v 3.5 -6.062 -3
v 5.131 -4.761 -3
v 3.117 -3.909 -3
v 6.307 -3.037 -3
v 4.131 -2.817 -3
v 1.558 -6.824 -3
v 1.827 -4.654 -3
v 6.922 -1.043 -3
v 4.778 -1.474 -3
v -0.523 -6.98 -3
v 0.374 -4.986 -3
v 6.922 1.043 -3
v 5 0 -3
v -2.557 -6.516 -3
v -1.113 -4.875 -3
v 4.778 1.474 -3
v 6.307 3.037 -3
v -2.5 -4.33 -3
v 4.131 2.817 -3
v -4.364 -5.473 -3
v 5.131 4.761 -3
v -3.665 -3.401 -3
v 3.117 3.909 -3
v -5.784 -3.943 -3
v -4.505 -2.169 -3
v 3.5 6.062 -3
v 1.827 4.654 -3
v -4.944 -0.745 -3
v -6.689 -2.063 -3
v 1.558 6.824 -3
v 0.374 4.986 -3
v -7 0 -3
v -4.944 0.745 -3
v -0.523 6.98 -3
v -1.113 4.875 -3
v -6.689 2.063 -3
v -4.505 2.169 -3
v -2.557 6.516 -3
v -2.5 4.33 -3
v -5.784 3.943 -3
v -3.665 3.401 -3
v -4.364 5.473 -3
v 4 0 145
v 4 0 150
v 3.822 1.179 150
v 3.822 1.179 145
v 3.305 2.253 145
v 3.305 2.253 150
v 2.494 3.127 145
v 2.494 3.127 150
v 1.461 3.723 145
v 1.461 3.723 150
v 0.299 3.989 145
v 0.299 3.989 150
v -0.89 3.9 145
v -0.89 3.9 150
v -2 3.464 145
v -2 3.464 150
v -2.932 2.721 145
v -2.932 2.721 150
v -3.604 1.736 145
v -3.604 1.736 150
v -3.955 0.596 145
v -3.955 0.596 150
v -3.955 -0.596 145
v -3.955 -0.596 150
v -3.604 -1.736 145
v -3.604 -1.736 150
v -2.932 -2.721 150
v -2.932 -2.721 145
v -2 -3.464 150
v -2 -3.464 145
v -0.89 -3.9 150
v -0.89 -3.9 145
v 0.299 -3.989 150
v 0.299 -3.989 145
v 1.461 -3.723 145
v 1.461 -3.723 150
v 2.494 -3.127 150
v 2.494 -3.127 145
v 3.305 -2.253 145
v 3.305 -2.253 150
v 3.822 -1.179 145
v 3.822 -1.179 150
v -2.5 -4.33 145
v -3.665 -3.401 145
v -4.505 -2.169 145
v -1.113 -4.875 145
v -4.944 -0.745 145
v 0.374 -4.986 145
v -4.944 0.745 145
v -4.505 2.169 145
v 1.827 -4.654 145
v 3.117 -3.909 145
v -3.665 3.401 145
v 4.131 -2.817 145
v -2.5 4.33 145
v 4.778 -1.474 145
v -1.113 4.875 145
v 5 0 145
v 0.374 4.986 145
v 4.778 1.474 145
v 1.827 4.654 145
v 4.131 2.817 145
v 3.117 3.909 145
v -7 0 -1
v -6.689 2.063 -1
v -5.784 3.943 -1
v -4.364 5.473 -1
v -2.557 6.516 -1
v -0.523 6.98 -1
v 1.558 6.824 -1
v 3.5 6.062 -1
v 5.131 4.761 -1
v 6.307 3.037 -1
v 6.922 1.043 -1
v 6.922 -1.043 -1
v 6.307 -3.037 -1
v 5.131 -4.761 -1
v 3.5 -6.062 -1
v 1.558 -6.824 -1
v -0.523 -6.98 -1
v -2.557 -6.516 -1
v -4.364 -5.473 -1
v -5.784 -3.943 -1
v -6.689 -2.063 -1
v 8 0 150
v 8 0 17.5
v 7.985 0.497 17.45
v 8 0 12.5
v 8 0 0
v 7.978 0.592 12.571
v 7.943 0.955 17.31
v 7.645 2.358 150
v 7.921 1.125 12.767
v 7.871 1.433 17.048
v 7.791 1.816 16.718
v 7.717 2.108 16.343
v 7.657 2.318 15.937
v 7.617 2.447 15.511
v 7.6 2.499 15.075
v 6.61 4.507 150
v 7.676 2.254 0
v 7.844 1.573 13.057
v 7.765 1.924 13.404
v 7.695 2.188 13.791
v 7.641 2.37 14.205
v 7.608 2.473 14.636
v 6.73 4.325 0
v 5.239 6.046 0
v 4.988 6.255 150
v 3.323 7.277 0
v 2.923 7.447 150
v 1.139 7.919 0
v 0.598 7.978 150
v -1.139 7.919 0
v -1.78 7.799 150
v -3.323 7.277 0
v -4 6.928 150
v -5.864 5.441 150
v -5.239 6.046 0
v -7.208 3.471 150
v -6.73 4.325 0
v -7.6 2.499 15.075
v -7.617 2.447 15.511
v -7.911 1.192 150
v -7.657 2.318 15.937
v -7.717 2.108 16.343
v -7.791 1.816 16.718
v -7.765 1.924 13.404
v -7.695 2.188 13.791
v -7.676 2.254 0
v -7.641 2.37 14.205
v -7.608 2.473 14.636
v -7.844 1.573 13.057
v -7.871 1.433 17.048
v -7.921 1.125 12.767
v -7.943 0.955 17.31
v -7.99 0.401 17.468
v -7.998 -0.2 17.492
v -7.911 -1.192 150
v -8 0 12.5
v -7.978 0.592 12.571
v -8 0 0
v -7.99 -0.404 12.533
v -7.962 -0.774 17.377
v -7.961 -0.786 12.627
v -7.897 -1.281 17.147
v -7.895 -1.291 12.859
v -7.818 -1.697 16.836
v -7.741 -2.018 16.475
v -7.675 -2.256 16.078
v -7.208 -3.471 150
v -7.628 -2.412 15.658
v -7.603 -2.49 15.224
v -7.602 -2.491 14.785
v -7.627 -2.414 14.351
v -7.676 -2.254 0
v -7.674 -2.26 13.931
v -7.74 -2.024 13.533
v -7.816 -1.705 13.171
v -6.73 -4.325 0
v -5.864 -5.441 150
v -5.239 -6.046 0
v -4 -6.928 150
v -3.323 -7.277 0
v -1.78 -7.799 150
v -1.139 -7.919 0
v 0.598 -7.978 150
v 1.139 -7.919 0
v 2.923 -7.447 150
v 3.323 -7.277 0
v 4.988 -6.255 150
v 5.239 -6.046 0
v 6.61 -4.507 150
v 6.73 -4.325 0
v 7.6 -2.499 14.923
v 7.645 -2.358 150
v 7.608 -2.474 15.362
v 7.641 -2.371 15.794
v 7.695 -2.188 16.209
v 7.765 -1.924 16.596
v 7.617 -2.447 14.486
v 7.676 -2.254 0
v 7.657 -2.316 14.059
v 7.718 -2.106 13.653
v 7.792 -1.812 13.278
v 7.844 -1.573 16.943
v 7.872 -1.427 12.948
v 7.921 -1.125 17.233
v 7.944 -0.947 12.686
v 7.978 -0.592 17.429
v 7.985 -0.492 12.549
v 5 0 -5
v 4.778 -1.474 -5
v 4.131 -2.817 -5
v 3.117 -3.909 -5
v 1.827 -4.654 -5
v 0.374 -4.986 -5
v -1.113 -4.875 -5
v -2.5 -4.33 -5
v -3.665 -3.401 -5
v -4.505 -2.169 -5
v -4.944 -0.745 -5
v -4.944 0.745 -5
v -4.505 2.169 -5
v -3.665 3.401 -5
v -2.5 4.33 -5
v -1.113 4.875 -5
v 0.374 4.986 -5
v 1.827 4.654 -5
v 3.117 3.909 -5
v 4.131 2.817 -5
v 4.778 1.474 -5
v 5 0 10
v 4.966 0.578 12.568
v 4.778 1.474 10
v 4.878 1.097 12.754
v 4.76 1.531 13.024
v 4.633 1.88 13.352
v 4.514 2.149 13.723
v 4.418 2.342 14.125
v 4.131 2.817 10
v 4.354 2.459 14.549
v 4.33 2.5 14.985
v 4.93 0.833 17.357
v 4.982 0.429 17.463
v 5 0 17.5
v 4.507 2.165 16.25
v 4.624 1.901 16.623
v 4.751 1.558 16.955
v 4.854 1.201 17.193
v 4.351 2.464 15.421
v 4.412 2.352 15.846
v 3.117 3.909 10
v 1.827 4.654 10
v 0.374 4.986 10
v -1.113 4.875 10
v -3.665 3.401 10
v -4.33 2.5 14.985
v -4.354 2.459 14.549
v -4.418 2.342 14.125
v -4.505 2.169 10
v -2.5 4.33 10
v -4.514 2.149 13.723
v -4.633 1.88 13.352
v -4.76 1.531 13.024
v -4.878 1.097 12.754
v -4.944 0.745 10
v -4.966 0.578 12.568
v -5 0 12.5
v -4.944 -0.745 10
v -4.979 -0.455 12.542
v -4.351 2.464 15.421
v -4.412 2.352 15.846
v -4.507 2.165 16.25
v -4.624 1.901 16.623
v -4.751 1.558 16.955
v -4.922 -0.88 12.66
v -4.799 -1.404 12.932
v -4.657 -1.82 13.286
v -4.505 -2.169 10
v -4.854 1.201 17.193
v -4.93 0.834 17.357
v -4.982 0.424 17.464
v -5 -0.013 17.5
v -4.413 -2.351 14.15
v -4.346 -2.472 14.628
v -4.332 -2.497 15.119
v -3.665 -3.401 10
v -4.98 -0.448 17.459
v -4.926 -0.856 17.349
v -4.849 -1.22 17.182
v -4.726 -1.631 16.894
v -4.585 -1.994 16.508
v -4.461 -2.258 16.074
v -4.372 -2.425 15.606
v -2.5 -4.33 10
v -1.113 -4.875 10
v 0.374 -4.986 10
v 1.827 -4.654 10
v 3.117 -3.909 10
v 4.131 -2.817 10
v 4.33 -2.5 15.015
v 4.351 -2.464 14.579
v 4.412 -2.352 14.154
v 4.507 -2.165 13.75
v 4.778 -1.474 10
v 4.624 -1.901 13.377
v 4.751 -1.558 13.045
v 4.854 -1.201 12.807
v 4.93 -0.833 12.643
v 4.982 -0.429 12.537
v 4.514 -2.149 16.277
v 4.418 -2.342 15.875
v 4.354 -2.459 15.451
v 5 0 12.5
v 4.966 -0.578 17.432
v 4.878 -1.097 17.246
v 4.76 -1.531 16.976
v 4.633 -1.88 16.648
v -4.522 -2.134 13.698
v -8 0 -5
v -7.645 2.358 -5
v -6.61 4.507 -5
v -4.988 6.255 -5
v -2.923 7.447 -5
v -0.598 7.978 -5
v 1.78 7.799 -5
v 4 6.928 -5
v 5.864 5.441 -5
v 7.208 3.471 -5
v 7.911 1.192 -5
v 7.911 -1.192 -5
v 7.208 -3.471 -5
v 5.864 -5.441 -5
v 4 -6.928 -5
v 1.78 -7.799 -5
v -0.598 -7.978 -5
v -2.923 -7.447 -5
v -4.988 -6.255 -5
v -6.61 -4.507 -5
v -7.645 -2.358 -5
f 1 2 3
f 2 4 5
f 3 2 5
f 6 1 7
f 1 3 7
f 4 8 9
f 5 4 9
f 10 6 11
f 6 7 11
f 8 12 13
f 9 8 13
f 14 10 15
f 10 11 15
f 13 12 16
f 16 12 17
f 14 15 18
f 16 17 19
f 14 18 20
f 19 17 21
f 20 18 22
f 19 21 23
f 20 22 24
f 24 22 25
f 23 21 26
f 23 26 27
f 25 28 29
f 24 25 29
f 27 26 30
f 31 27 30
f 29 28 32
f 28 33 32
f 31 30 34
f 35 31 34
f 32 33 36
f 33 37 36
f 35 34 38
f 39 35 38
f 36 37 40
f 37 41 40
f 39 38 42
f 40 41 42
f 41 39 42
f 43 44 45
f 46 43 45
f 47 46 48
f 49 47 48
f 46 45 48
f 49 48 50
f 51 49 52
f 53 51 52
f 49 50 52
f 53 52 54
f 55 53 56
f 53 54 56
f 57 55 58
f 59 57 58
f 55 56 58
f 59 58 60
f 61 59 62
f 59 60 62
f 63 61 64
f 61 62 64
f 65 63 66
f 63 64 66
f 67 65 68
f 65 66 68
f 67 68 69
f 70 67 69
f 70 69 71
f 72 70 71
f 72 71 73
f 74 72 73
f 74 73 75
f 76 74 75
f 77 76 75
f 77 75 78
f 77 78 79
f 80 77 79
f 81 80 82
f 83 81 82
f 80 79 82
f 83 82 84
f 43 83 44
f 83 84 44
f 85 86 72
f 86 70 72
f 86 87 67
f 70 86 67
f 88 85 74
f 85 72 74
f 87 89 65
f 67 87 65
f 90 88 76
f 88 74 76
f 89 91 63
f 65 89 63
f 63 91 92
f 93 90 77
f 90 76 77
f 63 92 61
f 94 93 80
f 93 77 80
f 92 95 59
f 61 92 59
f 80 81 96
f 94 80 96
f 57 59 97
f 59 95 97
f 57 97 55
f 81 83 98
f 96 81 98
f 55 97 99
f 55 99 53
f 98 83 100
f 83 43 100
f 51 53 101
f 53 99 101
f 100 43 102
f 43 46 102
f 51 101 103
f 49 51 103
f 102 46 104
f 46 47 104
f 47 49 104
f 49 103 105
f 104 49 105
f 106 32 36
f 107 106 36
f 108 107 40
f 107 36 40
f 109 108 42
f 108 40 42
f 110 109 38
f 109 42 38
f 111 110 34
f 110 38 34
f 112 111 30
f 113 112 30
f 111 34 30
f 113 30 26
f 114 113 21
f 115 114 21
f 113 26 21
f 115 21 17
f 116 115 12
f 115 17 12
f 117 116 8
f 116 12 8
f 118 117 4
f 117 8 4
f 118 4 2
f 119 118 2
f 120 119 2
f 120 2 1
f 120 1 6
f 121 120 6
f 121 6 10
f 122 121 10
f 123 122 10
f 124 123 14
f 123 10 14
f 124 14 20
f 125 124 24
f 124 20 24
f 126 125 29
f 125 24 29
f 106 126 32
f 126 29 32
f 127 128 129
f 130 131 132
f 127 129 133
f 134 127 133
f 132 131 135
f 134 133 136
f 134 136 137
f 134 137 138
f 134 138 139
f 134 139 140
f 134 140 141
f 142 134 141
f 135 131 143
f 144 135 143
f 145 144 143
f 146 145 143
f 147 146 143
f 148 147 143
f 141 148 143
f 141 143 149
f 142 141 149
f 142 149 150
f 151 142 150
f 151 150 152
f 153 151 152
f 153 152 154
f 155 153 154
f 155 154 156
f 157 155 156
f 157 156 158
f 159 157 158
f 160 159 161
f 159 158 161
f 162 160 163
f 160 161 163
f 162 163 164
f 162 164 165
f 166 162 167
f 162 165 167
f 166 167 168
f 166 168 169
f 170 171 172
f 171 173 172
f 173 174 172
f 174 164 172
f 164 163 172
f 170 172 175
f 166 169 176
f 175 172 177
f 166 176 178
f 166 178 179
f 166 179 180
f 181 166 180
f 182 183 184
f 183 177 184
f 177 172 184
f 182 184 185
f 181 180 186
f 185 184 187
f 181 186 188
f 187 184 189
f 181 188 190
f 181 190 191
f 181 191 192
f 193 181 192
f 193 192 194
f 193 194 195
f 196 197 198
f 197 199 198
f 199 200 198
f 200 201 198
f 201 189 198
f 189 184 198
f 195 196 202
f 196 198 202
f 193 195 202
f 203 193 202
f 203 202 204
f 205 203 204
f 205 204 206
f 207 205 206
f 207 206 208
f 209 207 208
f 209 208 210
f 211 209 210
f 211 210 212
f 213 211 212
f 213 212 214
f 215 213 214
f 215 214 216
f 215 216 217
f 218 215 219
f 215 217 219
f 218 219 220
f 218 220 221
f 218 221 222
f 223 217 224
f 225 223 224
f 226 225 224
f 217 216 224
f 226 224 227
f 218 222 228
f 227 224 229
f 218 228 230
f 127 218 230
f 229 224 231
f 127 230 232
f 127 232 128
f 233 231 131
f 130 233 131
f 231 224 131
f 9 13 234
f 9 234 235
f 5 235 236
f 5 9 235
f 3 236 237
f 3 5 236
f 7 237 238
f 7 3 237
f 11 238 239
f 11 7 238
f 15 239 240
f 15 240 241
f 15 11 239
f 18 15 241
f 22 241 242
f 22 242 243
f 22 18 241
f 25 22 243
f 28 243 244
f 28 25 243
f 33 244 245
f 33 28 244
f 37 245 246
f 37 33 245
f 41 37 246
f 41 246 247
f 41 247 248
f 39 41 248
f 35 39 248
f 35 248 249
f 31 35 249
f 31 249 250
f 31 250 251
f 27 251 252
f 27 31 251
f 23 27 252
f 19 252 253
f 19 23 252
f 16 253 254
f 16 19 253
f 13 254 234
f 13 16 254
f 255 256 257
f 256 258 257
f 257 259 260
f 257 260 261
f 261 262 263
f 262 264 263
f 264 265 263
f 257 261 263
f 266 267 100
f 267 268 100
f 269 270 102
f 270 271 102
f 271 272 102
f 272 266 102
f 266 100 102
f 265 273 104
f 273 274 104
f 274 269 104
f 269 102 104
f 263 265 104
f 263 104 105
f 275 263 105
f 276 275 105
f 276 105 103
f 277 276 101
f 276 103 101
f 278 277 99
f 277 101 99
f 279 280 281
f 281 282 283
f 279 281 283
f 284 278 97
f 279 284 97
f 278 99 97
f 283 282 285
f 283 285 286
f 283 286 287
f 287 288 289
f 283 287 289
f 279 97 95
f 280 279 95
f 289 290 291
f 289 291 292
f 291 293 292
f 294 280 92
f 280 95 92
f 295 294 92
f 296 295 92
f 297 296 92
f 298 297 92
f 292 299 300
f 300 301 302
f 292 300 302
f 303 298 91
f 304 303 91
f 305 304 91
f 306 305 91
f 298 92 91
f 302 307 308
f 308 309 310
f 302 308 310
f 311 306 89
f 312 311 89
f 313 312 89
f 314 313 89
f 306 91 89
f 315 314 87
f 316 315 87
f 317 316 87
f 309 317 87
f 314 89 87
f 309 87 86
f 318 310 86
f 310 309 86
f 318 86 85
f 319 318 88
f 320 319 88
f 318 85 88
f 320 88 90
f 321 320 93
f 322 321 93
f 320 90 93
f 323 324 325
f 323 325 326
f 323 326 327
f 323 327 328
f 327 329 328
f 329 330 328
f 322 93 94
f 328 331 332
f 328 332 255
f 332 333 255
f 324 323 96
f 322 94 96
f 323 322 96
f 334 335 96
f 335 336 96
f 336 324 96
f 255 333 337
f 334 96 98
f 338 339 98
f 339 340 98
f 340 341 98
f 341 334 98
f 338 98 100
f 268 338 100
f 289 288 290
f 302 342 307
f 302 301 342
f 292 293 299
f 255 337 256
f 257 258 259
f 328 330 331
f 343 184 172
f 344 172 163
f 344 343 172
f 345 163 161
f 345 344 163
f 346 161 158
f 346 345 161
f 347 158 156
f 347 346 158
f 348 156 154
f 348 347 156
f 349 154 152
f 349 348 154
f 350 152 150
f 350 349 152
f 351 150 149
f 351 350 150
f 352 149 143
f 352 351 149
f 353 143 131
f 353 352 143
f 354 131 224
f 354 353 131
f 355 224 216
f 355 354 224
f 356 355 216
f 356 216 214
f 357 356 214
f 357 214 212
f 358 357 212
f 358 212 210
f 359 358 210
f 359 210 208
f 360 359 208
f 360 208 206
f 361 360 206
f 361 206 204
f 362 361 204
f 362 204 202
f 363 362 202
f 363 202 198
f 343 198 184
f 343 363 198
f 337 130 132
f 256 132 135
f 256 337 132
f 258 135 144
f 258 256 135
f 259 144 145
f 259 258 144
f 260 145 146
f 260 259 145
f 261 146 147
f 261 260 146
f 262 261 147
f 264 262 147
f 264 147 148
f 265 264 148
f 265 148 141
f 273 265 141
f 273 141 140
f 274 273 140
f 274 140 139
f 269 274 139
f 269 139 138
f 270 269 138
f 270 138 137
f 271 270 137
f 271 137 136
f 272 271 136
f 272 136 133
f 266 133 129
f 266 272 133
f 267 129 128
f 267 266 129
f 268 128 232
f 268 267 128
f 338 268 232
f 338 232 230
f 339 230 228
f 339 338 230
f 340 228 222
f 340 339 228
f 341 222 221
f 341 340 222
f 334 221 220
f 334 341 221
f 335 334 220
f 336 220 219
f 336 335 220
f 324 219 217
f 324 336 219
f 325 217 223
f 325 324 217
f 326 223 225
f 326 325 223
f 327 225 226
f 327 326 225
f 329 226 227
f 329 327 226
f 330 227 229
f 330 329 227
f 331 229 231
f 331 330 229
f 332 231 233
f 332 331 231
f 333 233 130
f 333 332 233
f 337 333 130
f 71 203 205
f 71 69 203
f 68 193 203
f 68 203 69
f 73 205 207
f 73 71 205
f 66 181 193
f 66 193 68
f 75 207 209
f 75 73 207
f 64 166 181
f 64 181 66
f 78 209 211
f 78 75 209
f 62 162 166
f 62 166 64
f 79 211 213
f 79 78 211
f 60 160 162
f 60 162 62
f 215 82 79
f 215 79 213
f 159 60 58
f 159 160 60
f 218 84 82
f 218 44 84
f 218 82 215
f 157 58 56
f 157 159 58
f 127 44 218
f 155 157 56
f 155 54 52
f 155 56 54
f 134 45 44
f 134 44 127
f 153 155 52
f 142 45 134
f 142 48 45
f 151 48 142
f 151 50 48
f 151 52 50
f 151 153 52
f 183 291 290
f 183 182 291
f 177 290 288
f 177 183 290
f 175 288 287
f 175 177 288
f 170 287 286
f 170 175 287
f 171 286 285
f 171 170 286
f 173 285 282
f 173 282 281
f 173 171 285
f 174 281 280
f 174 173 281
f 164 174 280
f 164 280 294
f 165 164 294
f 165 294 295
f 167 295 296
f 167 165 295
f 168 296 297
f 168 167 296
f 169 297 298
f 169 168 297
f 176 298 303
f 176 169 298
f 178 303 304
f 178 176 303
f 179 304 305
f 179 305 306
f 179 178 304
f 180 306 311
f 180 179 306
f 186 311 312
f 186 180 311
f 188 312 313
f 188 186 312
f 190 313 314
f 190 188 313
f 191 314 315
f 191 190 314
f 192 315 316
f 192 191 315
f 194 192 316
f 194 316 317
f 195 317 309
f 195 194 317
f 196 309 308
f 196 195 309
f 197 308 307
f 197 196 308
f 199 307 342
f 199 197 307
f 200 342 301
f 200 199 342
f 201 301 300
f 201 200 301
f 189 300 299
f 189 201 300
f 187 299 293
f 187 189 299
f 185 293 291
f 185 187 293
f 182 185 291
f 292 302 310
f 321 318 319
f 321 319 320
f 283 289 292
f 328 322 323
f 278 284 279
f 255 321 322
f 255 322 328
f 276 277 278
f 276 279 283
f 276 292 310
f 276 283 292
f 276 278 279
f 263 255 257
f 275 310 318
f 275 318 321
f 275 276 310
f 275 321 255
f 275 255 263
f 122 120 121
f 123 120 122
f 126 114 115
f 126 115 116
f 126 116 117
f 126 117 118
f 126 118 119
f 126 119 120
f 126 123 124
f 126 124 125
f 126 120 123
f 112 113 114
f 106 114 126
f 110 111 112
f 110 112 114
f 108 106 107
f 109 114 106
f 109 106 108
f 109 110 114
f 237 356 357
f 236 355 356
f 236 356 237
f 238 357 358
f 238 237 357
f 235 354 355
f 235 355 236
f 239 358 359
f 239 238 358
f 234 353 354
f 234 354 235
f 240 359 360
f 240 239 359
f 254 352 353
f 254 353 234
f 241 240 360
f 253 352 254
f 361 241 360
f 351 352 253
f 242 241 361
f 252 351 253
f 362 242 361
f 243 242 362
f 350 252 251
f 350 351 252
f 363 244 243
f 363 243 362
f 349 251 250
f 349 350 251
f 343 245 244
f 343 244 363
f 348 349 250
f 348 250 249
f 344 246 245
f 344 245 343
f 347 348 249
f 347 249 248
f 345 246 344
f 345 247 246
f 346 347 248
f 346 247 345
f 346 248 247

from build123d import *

# Parameters (mm, degrees)
SKETCH1_R               = 8
BOSS_EXTRUDE1_DEPTH     = 150
SKETCH2_R               = 4
CUT_EXTRUDE1_DEPTH      = 5
SKETCH3_R               = 5
CUT_EXTRUDE2_DEPTH      = 135
CUT_EXTRUDE3_DEPTH      = 151.426061572
CUT_EXTRUDE3_DEPTH_BACK = 151.426061572
SKETCH4_R               = 2.5
BOSS_EXTRUDE2_START     = 5
SKETCH5_R               = 8
BOSS_EXTRUDE2_DEPTH     = 5
CUT_EXTRUDE4_START      = -2
SKETCH6_R               = 5
CUT_EXTRUDE4_DEPTH      = 2
SKETCH7_R               = 7
CUT_EXTRUDE5_DEPTH      = 2


with BuildPart() as part:
    # Sketch1 → Boss-Extrude1 (new body)
    with BuildSketch(Plane.XY):
        Circle(SKETCH1_R)
    extrude(amount=BOSS_EXTRUDE1_DEPTH)

    # Sketch2 → Cut-Extrude1 (cut)
    with BuildSketch(Plane.XY.offset(150)):
        Circle(SKETCH2_R)
    extrude(amount=-CUT_EXTRUDE1_DEPTH, mode=Mode.SUBTRACT)

    # Sketch3 → Cut-Extrude2 (cut)
    with BuildSketch(Plane.XY.offset(145)):
        Circle(SKETCH3_R)
    extrude(amount=-CUT_EXTRUDE2_DEPTH, mode=Mode.SUBTRACT)

    # Sketch4 → Cut-Extrude3 (cut, two sides: drawn at the far end of the back side and taken through both)
    with BuildSketch(Plane(origin=(0, 0, 0), x_dir=(0, 0, -1), z_dir=(1, 0, 0)).offset(-CUT_EXTRUDE3_DEPTH_BACK)):
        with Locations((-15, 0)):
            Circle(SKETCH4_R)
    extrude(amount=CUT_EXTRUDE3_DEPTH + CUT_EXTRUDE3_DEPTH_BACK, mode=Mode.SUBTRACT)

    # Sketch5 → Boss-Extrude2 (add)
    with BuildSketch(Plane(origin=(0, 0, 0), x_dir=(-1, 0, 0), z_dir=(0, 0, -1)).offset(BOSS_EXTRUDE2_START)):
        Circle(SKETCH5_R)
    extrude(amount=-BOSS_EXTRUDE2_DEPTH)

    # Sketch6 → Cut-Extrude4 (cut)
    with BuildSketch(Plane(origin=(0, 0, -5), x_dir=(-1, 0, 0), z_dir=(0, 0, -1)).offset(CUT_EXTRUDE4_START)):
        with Locations(Location((0, 0, 0), (0, 0, 180))):
            Circle(SKETCH6_R)
    extrude(amount=CUT_EXTRUDE4_DEPTH, mode=Mode.SUBTRACT)

    # Sketch7 → Cut-Extrude5 (cut)
    with BuildSketch(Plane(origin=(0, 0, -3), x_dir=(-1, 0, 0), z_dir=(0, 0, -1))):
        Circle(SKETCH7_R)
    extrude(amount=-CUT_EXTRUDE5_DEPTH, mode=Mode.SUBTRACT)


solid = part.part
